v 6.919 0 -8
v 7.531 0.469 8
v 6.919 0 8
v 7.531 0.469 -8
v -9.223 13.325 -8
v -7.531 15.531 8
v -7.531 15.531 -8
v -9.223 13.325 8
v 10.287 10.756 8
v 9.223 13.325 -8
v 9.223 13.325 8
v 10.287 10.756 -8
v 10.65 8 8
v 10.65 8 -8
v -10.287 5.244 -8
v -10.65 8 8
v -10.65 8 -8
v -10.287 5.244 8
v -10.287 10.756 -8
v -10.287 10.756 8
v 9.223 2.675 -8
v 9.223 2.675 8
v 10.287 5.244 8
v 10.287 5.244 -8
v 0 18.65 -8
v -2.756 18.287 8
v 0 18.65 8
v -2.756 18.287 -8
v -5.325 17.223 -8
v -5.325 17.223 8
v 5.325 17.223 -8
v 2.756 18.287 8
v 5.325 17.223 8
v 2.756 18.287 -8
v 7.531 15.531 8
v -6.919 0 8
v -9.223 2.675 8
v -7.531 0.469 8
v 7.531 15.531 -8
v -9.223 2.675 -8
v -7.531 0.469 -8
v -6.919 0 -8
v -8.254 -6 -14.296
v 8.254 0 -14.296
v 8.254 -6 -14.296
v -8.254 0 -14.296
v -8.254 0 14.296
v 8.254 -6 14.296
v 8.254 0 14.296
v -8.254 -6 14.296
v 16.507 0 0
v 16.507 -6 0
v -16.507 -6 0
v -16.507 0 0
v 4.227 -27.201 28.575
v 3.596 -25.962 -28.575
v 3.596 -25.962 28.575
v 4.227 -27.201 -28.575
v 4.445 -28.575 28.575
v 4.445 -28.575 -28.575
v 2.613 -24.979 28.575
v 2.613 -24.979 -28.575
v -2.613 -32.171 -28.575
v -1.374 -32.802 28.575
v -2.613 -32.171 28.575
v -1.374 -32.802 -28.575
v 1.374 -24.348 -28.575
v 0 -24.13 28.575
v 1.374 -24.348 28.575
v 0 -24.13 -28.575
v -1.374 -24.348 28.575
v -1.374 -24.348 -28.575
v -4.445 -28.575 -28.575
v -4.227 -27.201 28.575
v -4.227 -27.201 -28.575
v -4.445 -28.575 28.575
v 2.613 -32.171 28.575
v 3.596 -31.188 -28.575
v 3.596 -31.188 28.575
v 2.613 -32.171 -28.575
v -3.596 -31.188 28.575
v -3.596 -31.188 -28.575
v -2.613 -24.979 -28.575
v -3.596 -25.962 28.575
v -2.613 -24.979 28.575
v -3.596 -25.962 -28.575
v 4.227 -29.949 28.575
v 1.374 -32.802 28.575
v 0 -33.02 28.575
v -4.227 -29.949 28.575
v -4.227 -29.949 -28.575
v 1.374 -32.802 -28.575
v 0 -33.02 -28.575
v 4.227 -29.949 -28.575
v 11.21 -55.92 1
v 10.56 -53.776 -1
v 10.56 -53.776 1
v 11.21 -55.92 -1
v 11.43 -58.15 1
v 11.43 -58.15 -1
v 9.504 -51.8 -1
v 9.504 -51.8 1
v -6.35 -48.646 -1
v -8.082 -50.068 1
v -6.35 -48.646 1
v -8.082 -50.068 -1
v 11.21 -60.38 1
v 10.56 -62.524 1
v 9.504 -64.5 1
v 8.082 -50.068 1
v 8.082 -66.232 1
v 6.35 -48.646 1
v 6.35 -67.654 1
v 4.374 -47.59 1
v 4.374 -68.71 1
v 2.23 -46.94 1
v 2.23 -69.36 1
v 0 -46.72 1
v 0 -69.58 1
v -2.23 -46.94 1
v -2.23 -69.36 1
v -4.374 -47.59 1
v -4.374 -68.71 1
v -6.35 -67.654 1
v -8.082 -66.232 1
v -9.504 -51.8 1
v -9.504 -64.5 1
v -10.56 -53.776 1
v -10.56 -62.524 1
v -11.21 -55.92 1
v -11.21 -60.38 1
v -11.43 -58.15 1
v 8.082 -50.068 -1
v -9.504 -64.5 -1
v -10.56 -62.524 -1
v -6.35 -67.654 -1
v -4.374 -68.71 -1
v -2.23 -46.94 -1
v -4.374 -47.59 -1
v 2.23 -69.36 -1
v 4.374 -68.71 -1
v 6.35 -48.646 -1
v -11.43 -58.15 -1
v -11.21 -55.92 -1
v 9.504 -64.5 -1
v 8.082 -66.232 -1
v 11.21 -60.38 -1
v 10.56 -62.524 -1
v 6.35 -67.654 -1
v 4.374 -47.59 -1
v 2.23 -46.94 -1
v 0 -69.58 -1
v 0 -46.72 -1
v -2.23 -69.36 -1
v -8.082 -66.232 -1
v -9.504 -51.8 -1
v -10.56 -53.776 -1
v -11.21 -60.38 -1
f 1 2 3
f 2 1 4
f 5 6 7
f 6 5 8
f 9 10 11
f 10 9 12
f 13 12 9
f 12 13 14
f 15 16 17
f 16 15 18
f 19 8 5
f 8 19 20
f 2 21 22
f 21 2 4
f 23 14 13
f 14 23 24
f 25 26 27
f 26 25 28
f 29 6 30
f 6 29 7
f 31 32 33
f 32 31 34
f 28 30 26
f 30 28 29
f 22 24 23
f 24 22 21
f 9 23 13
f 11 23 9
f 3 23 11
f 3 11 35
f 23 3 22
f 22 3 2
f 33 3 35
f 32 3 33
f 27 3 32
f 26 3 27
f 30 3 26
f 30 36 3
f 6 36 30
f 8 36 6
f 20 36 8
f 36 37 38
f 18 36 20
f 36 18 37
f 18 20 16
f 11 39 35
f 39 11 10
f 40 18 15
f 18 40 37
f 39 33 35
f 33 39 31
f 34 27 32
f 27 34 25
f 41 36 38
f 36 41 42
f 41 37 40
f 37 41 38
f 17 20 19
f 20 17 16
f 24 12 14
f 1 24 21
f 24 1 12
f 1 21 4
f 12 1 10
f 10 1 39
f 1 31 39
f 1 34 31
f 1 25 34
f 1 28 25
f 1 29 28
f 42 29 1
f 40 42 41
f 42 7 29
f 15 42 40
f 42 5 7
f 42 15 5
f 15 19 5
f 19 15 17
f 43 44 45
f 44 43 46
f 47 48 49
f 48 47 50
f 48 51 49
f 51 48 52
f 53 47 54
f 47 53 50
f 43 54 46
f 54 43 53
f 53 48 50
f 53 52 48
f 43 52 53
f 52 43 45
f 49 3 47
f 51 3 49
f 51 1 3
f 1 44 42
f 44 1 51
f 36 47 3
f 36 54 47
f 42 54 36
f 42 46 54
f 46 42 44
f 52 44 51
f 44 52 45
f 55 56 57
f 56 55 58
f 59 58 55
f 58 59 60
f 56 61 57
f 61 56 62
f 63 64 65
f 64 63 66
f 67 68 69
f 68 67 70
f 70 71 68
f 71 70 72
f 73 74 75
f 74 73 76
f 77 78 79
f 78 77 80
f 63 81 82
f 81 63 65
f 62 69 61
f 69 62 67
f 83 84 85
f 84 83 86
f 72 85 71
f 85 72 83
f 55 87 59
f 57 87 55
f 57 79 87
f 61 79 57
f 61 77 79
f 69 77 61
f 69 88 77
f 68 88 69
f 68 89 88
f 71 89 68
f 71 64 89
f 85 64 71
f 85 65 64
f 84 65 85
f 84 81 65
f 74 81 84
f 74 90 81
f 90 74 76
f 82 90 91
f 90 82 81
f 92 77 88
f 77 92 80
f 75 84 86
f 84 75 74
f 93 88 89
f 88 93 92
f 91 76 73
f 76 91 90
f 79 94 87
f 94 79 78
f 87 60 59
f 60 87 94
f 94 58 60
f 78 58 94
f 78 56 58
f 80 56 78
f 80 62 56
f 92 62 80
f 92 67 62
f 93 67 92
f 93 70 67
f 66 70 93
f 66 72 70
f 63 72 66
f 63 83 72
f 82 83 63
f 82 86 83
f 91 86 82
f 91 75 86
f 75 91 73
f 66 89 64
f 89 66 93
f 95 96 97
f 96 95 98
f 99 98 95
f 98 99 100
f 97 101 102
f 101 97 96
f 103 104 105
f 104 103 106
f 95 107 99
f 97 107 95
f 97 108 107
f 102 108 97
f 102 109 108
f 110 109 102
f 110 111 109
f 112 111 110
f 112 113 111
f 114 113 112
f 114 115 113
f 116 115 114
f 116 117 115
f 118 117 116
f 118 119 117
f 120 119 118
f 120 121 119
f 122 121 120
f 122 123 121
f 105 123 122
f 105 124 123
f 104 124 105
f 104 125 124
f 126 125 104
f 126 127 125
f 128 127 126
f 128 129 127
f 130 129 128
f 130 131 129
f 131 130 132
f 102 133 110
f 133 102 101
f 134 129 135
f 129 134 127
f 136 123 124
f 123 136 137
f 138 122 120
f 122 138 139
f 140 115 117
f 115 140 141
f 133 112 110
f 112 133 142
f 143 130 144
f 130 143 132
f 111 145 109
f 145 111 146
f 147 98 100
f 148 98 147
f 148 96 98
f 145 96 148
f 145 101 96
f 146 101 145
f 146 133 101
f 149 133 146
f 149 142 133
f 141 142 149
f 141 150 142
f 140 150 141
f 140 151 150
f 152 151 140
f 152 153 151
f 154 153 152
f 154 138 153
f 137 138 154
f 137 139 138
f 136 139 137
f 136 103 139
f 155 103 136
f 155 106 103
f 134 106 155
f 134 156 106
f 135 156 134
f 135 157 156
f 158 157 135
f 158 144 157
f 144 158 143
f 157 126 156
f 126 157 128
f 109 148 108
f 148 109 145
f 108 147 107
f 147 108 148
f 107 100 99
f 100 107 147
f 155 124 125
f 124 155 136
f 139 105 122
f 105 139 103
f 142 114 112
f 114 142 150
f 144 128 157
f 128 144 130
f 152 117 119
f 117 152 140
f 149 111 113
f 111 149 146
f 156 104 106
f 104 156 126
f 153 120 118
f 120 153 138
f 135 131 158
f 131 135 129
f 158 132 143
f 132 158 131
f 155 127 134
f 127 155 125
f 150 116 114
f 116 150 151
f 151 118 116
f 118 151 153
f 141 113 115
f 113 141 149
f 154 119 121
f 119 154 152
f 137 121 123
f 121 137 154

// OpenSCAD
// Auto-generated by scripts/author_from_manifest.py (Phase D.3).
// Source: data/phase_d_manifest.json (sku_intent='tyco-ty4251-pendent-k80-155f').
// Do not hand-edit — regenerate from the manifest.
//
// @part tyco_ty4251_pendent_k80_155f
// @kind sprinkler_head
// @category head.pendant.k80
// @display-name "Tyco TY4251 Pendent K8.0 SR 155°F"
// @mfg tyco_fire_protection
// @mfg-pn TY4251
// @listing UL FM
// @hazard-classes OH1 OH2
// @price-usd 16.90
// @install-minutes 8
// @crew journeyman
// @k-factor 8
// @orientation pendant
// @response standard
// @temperature 155F
// @param size_in number default=0.5 label="Size" unit="in"
// @port inlet position=[0,0.014,0] direction=[0,1,0] style=NPT_threaded size_in=0.5 role=drop

size_in = 0.5;
k_factor = 8.0;

length_mm   = 57.15;
body_dia_mm = 25.40;
thread_od   = 21.3;
thread_len  = 16;
deflector_d = body_dia_mm * 0.9;

 union() {
    translate([0, thread_len/2, 0])
        cylinder(h = thread_len, d = thread_od, center = true, $fn = 24);
    translate([0, -3, 0])
        rotate([90, 0, 0])
        cylinder(h = 6, d = thread_od * 1.55, $fn = 6, center = true);
    translate([0, -length_mm/2, 0])
        cylinder(h = length_mm, d = body_dia_mm * 0.35, center = true, $fn = 20);
    translate([0, -length_mm - 1, 0])
        cylinder(h = 2, d = deflector_d, center = true, $fn = 32);
}
